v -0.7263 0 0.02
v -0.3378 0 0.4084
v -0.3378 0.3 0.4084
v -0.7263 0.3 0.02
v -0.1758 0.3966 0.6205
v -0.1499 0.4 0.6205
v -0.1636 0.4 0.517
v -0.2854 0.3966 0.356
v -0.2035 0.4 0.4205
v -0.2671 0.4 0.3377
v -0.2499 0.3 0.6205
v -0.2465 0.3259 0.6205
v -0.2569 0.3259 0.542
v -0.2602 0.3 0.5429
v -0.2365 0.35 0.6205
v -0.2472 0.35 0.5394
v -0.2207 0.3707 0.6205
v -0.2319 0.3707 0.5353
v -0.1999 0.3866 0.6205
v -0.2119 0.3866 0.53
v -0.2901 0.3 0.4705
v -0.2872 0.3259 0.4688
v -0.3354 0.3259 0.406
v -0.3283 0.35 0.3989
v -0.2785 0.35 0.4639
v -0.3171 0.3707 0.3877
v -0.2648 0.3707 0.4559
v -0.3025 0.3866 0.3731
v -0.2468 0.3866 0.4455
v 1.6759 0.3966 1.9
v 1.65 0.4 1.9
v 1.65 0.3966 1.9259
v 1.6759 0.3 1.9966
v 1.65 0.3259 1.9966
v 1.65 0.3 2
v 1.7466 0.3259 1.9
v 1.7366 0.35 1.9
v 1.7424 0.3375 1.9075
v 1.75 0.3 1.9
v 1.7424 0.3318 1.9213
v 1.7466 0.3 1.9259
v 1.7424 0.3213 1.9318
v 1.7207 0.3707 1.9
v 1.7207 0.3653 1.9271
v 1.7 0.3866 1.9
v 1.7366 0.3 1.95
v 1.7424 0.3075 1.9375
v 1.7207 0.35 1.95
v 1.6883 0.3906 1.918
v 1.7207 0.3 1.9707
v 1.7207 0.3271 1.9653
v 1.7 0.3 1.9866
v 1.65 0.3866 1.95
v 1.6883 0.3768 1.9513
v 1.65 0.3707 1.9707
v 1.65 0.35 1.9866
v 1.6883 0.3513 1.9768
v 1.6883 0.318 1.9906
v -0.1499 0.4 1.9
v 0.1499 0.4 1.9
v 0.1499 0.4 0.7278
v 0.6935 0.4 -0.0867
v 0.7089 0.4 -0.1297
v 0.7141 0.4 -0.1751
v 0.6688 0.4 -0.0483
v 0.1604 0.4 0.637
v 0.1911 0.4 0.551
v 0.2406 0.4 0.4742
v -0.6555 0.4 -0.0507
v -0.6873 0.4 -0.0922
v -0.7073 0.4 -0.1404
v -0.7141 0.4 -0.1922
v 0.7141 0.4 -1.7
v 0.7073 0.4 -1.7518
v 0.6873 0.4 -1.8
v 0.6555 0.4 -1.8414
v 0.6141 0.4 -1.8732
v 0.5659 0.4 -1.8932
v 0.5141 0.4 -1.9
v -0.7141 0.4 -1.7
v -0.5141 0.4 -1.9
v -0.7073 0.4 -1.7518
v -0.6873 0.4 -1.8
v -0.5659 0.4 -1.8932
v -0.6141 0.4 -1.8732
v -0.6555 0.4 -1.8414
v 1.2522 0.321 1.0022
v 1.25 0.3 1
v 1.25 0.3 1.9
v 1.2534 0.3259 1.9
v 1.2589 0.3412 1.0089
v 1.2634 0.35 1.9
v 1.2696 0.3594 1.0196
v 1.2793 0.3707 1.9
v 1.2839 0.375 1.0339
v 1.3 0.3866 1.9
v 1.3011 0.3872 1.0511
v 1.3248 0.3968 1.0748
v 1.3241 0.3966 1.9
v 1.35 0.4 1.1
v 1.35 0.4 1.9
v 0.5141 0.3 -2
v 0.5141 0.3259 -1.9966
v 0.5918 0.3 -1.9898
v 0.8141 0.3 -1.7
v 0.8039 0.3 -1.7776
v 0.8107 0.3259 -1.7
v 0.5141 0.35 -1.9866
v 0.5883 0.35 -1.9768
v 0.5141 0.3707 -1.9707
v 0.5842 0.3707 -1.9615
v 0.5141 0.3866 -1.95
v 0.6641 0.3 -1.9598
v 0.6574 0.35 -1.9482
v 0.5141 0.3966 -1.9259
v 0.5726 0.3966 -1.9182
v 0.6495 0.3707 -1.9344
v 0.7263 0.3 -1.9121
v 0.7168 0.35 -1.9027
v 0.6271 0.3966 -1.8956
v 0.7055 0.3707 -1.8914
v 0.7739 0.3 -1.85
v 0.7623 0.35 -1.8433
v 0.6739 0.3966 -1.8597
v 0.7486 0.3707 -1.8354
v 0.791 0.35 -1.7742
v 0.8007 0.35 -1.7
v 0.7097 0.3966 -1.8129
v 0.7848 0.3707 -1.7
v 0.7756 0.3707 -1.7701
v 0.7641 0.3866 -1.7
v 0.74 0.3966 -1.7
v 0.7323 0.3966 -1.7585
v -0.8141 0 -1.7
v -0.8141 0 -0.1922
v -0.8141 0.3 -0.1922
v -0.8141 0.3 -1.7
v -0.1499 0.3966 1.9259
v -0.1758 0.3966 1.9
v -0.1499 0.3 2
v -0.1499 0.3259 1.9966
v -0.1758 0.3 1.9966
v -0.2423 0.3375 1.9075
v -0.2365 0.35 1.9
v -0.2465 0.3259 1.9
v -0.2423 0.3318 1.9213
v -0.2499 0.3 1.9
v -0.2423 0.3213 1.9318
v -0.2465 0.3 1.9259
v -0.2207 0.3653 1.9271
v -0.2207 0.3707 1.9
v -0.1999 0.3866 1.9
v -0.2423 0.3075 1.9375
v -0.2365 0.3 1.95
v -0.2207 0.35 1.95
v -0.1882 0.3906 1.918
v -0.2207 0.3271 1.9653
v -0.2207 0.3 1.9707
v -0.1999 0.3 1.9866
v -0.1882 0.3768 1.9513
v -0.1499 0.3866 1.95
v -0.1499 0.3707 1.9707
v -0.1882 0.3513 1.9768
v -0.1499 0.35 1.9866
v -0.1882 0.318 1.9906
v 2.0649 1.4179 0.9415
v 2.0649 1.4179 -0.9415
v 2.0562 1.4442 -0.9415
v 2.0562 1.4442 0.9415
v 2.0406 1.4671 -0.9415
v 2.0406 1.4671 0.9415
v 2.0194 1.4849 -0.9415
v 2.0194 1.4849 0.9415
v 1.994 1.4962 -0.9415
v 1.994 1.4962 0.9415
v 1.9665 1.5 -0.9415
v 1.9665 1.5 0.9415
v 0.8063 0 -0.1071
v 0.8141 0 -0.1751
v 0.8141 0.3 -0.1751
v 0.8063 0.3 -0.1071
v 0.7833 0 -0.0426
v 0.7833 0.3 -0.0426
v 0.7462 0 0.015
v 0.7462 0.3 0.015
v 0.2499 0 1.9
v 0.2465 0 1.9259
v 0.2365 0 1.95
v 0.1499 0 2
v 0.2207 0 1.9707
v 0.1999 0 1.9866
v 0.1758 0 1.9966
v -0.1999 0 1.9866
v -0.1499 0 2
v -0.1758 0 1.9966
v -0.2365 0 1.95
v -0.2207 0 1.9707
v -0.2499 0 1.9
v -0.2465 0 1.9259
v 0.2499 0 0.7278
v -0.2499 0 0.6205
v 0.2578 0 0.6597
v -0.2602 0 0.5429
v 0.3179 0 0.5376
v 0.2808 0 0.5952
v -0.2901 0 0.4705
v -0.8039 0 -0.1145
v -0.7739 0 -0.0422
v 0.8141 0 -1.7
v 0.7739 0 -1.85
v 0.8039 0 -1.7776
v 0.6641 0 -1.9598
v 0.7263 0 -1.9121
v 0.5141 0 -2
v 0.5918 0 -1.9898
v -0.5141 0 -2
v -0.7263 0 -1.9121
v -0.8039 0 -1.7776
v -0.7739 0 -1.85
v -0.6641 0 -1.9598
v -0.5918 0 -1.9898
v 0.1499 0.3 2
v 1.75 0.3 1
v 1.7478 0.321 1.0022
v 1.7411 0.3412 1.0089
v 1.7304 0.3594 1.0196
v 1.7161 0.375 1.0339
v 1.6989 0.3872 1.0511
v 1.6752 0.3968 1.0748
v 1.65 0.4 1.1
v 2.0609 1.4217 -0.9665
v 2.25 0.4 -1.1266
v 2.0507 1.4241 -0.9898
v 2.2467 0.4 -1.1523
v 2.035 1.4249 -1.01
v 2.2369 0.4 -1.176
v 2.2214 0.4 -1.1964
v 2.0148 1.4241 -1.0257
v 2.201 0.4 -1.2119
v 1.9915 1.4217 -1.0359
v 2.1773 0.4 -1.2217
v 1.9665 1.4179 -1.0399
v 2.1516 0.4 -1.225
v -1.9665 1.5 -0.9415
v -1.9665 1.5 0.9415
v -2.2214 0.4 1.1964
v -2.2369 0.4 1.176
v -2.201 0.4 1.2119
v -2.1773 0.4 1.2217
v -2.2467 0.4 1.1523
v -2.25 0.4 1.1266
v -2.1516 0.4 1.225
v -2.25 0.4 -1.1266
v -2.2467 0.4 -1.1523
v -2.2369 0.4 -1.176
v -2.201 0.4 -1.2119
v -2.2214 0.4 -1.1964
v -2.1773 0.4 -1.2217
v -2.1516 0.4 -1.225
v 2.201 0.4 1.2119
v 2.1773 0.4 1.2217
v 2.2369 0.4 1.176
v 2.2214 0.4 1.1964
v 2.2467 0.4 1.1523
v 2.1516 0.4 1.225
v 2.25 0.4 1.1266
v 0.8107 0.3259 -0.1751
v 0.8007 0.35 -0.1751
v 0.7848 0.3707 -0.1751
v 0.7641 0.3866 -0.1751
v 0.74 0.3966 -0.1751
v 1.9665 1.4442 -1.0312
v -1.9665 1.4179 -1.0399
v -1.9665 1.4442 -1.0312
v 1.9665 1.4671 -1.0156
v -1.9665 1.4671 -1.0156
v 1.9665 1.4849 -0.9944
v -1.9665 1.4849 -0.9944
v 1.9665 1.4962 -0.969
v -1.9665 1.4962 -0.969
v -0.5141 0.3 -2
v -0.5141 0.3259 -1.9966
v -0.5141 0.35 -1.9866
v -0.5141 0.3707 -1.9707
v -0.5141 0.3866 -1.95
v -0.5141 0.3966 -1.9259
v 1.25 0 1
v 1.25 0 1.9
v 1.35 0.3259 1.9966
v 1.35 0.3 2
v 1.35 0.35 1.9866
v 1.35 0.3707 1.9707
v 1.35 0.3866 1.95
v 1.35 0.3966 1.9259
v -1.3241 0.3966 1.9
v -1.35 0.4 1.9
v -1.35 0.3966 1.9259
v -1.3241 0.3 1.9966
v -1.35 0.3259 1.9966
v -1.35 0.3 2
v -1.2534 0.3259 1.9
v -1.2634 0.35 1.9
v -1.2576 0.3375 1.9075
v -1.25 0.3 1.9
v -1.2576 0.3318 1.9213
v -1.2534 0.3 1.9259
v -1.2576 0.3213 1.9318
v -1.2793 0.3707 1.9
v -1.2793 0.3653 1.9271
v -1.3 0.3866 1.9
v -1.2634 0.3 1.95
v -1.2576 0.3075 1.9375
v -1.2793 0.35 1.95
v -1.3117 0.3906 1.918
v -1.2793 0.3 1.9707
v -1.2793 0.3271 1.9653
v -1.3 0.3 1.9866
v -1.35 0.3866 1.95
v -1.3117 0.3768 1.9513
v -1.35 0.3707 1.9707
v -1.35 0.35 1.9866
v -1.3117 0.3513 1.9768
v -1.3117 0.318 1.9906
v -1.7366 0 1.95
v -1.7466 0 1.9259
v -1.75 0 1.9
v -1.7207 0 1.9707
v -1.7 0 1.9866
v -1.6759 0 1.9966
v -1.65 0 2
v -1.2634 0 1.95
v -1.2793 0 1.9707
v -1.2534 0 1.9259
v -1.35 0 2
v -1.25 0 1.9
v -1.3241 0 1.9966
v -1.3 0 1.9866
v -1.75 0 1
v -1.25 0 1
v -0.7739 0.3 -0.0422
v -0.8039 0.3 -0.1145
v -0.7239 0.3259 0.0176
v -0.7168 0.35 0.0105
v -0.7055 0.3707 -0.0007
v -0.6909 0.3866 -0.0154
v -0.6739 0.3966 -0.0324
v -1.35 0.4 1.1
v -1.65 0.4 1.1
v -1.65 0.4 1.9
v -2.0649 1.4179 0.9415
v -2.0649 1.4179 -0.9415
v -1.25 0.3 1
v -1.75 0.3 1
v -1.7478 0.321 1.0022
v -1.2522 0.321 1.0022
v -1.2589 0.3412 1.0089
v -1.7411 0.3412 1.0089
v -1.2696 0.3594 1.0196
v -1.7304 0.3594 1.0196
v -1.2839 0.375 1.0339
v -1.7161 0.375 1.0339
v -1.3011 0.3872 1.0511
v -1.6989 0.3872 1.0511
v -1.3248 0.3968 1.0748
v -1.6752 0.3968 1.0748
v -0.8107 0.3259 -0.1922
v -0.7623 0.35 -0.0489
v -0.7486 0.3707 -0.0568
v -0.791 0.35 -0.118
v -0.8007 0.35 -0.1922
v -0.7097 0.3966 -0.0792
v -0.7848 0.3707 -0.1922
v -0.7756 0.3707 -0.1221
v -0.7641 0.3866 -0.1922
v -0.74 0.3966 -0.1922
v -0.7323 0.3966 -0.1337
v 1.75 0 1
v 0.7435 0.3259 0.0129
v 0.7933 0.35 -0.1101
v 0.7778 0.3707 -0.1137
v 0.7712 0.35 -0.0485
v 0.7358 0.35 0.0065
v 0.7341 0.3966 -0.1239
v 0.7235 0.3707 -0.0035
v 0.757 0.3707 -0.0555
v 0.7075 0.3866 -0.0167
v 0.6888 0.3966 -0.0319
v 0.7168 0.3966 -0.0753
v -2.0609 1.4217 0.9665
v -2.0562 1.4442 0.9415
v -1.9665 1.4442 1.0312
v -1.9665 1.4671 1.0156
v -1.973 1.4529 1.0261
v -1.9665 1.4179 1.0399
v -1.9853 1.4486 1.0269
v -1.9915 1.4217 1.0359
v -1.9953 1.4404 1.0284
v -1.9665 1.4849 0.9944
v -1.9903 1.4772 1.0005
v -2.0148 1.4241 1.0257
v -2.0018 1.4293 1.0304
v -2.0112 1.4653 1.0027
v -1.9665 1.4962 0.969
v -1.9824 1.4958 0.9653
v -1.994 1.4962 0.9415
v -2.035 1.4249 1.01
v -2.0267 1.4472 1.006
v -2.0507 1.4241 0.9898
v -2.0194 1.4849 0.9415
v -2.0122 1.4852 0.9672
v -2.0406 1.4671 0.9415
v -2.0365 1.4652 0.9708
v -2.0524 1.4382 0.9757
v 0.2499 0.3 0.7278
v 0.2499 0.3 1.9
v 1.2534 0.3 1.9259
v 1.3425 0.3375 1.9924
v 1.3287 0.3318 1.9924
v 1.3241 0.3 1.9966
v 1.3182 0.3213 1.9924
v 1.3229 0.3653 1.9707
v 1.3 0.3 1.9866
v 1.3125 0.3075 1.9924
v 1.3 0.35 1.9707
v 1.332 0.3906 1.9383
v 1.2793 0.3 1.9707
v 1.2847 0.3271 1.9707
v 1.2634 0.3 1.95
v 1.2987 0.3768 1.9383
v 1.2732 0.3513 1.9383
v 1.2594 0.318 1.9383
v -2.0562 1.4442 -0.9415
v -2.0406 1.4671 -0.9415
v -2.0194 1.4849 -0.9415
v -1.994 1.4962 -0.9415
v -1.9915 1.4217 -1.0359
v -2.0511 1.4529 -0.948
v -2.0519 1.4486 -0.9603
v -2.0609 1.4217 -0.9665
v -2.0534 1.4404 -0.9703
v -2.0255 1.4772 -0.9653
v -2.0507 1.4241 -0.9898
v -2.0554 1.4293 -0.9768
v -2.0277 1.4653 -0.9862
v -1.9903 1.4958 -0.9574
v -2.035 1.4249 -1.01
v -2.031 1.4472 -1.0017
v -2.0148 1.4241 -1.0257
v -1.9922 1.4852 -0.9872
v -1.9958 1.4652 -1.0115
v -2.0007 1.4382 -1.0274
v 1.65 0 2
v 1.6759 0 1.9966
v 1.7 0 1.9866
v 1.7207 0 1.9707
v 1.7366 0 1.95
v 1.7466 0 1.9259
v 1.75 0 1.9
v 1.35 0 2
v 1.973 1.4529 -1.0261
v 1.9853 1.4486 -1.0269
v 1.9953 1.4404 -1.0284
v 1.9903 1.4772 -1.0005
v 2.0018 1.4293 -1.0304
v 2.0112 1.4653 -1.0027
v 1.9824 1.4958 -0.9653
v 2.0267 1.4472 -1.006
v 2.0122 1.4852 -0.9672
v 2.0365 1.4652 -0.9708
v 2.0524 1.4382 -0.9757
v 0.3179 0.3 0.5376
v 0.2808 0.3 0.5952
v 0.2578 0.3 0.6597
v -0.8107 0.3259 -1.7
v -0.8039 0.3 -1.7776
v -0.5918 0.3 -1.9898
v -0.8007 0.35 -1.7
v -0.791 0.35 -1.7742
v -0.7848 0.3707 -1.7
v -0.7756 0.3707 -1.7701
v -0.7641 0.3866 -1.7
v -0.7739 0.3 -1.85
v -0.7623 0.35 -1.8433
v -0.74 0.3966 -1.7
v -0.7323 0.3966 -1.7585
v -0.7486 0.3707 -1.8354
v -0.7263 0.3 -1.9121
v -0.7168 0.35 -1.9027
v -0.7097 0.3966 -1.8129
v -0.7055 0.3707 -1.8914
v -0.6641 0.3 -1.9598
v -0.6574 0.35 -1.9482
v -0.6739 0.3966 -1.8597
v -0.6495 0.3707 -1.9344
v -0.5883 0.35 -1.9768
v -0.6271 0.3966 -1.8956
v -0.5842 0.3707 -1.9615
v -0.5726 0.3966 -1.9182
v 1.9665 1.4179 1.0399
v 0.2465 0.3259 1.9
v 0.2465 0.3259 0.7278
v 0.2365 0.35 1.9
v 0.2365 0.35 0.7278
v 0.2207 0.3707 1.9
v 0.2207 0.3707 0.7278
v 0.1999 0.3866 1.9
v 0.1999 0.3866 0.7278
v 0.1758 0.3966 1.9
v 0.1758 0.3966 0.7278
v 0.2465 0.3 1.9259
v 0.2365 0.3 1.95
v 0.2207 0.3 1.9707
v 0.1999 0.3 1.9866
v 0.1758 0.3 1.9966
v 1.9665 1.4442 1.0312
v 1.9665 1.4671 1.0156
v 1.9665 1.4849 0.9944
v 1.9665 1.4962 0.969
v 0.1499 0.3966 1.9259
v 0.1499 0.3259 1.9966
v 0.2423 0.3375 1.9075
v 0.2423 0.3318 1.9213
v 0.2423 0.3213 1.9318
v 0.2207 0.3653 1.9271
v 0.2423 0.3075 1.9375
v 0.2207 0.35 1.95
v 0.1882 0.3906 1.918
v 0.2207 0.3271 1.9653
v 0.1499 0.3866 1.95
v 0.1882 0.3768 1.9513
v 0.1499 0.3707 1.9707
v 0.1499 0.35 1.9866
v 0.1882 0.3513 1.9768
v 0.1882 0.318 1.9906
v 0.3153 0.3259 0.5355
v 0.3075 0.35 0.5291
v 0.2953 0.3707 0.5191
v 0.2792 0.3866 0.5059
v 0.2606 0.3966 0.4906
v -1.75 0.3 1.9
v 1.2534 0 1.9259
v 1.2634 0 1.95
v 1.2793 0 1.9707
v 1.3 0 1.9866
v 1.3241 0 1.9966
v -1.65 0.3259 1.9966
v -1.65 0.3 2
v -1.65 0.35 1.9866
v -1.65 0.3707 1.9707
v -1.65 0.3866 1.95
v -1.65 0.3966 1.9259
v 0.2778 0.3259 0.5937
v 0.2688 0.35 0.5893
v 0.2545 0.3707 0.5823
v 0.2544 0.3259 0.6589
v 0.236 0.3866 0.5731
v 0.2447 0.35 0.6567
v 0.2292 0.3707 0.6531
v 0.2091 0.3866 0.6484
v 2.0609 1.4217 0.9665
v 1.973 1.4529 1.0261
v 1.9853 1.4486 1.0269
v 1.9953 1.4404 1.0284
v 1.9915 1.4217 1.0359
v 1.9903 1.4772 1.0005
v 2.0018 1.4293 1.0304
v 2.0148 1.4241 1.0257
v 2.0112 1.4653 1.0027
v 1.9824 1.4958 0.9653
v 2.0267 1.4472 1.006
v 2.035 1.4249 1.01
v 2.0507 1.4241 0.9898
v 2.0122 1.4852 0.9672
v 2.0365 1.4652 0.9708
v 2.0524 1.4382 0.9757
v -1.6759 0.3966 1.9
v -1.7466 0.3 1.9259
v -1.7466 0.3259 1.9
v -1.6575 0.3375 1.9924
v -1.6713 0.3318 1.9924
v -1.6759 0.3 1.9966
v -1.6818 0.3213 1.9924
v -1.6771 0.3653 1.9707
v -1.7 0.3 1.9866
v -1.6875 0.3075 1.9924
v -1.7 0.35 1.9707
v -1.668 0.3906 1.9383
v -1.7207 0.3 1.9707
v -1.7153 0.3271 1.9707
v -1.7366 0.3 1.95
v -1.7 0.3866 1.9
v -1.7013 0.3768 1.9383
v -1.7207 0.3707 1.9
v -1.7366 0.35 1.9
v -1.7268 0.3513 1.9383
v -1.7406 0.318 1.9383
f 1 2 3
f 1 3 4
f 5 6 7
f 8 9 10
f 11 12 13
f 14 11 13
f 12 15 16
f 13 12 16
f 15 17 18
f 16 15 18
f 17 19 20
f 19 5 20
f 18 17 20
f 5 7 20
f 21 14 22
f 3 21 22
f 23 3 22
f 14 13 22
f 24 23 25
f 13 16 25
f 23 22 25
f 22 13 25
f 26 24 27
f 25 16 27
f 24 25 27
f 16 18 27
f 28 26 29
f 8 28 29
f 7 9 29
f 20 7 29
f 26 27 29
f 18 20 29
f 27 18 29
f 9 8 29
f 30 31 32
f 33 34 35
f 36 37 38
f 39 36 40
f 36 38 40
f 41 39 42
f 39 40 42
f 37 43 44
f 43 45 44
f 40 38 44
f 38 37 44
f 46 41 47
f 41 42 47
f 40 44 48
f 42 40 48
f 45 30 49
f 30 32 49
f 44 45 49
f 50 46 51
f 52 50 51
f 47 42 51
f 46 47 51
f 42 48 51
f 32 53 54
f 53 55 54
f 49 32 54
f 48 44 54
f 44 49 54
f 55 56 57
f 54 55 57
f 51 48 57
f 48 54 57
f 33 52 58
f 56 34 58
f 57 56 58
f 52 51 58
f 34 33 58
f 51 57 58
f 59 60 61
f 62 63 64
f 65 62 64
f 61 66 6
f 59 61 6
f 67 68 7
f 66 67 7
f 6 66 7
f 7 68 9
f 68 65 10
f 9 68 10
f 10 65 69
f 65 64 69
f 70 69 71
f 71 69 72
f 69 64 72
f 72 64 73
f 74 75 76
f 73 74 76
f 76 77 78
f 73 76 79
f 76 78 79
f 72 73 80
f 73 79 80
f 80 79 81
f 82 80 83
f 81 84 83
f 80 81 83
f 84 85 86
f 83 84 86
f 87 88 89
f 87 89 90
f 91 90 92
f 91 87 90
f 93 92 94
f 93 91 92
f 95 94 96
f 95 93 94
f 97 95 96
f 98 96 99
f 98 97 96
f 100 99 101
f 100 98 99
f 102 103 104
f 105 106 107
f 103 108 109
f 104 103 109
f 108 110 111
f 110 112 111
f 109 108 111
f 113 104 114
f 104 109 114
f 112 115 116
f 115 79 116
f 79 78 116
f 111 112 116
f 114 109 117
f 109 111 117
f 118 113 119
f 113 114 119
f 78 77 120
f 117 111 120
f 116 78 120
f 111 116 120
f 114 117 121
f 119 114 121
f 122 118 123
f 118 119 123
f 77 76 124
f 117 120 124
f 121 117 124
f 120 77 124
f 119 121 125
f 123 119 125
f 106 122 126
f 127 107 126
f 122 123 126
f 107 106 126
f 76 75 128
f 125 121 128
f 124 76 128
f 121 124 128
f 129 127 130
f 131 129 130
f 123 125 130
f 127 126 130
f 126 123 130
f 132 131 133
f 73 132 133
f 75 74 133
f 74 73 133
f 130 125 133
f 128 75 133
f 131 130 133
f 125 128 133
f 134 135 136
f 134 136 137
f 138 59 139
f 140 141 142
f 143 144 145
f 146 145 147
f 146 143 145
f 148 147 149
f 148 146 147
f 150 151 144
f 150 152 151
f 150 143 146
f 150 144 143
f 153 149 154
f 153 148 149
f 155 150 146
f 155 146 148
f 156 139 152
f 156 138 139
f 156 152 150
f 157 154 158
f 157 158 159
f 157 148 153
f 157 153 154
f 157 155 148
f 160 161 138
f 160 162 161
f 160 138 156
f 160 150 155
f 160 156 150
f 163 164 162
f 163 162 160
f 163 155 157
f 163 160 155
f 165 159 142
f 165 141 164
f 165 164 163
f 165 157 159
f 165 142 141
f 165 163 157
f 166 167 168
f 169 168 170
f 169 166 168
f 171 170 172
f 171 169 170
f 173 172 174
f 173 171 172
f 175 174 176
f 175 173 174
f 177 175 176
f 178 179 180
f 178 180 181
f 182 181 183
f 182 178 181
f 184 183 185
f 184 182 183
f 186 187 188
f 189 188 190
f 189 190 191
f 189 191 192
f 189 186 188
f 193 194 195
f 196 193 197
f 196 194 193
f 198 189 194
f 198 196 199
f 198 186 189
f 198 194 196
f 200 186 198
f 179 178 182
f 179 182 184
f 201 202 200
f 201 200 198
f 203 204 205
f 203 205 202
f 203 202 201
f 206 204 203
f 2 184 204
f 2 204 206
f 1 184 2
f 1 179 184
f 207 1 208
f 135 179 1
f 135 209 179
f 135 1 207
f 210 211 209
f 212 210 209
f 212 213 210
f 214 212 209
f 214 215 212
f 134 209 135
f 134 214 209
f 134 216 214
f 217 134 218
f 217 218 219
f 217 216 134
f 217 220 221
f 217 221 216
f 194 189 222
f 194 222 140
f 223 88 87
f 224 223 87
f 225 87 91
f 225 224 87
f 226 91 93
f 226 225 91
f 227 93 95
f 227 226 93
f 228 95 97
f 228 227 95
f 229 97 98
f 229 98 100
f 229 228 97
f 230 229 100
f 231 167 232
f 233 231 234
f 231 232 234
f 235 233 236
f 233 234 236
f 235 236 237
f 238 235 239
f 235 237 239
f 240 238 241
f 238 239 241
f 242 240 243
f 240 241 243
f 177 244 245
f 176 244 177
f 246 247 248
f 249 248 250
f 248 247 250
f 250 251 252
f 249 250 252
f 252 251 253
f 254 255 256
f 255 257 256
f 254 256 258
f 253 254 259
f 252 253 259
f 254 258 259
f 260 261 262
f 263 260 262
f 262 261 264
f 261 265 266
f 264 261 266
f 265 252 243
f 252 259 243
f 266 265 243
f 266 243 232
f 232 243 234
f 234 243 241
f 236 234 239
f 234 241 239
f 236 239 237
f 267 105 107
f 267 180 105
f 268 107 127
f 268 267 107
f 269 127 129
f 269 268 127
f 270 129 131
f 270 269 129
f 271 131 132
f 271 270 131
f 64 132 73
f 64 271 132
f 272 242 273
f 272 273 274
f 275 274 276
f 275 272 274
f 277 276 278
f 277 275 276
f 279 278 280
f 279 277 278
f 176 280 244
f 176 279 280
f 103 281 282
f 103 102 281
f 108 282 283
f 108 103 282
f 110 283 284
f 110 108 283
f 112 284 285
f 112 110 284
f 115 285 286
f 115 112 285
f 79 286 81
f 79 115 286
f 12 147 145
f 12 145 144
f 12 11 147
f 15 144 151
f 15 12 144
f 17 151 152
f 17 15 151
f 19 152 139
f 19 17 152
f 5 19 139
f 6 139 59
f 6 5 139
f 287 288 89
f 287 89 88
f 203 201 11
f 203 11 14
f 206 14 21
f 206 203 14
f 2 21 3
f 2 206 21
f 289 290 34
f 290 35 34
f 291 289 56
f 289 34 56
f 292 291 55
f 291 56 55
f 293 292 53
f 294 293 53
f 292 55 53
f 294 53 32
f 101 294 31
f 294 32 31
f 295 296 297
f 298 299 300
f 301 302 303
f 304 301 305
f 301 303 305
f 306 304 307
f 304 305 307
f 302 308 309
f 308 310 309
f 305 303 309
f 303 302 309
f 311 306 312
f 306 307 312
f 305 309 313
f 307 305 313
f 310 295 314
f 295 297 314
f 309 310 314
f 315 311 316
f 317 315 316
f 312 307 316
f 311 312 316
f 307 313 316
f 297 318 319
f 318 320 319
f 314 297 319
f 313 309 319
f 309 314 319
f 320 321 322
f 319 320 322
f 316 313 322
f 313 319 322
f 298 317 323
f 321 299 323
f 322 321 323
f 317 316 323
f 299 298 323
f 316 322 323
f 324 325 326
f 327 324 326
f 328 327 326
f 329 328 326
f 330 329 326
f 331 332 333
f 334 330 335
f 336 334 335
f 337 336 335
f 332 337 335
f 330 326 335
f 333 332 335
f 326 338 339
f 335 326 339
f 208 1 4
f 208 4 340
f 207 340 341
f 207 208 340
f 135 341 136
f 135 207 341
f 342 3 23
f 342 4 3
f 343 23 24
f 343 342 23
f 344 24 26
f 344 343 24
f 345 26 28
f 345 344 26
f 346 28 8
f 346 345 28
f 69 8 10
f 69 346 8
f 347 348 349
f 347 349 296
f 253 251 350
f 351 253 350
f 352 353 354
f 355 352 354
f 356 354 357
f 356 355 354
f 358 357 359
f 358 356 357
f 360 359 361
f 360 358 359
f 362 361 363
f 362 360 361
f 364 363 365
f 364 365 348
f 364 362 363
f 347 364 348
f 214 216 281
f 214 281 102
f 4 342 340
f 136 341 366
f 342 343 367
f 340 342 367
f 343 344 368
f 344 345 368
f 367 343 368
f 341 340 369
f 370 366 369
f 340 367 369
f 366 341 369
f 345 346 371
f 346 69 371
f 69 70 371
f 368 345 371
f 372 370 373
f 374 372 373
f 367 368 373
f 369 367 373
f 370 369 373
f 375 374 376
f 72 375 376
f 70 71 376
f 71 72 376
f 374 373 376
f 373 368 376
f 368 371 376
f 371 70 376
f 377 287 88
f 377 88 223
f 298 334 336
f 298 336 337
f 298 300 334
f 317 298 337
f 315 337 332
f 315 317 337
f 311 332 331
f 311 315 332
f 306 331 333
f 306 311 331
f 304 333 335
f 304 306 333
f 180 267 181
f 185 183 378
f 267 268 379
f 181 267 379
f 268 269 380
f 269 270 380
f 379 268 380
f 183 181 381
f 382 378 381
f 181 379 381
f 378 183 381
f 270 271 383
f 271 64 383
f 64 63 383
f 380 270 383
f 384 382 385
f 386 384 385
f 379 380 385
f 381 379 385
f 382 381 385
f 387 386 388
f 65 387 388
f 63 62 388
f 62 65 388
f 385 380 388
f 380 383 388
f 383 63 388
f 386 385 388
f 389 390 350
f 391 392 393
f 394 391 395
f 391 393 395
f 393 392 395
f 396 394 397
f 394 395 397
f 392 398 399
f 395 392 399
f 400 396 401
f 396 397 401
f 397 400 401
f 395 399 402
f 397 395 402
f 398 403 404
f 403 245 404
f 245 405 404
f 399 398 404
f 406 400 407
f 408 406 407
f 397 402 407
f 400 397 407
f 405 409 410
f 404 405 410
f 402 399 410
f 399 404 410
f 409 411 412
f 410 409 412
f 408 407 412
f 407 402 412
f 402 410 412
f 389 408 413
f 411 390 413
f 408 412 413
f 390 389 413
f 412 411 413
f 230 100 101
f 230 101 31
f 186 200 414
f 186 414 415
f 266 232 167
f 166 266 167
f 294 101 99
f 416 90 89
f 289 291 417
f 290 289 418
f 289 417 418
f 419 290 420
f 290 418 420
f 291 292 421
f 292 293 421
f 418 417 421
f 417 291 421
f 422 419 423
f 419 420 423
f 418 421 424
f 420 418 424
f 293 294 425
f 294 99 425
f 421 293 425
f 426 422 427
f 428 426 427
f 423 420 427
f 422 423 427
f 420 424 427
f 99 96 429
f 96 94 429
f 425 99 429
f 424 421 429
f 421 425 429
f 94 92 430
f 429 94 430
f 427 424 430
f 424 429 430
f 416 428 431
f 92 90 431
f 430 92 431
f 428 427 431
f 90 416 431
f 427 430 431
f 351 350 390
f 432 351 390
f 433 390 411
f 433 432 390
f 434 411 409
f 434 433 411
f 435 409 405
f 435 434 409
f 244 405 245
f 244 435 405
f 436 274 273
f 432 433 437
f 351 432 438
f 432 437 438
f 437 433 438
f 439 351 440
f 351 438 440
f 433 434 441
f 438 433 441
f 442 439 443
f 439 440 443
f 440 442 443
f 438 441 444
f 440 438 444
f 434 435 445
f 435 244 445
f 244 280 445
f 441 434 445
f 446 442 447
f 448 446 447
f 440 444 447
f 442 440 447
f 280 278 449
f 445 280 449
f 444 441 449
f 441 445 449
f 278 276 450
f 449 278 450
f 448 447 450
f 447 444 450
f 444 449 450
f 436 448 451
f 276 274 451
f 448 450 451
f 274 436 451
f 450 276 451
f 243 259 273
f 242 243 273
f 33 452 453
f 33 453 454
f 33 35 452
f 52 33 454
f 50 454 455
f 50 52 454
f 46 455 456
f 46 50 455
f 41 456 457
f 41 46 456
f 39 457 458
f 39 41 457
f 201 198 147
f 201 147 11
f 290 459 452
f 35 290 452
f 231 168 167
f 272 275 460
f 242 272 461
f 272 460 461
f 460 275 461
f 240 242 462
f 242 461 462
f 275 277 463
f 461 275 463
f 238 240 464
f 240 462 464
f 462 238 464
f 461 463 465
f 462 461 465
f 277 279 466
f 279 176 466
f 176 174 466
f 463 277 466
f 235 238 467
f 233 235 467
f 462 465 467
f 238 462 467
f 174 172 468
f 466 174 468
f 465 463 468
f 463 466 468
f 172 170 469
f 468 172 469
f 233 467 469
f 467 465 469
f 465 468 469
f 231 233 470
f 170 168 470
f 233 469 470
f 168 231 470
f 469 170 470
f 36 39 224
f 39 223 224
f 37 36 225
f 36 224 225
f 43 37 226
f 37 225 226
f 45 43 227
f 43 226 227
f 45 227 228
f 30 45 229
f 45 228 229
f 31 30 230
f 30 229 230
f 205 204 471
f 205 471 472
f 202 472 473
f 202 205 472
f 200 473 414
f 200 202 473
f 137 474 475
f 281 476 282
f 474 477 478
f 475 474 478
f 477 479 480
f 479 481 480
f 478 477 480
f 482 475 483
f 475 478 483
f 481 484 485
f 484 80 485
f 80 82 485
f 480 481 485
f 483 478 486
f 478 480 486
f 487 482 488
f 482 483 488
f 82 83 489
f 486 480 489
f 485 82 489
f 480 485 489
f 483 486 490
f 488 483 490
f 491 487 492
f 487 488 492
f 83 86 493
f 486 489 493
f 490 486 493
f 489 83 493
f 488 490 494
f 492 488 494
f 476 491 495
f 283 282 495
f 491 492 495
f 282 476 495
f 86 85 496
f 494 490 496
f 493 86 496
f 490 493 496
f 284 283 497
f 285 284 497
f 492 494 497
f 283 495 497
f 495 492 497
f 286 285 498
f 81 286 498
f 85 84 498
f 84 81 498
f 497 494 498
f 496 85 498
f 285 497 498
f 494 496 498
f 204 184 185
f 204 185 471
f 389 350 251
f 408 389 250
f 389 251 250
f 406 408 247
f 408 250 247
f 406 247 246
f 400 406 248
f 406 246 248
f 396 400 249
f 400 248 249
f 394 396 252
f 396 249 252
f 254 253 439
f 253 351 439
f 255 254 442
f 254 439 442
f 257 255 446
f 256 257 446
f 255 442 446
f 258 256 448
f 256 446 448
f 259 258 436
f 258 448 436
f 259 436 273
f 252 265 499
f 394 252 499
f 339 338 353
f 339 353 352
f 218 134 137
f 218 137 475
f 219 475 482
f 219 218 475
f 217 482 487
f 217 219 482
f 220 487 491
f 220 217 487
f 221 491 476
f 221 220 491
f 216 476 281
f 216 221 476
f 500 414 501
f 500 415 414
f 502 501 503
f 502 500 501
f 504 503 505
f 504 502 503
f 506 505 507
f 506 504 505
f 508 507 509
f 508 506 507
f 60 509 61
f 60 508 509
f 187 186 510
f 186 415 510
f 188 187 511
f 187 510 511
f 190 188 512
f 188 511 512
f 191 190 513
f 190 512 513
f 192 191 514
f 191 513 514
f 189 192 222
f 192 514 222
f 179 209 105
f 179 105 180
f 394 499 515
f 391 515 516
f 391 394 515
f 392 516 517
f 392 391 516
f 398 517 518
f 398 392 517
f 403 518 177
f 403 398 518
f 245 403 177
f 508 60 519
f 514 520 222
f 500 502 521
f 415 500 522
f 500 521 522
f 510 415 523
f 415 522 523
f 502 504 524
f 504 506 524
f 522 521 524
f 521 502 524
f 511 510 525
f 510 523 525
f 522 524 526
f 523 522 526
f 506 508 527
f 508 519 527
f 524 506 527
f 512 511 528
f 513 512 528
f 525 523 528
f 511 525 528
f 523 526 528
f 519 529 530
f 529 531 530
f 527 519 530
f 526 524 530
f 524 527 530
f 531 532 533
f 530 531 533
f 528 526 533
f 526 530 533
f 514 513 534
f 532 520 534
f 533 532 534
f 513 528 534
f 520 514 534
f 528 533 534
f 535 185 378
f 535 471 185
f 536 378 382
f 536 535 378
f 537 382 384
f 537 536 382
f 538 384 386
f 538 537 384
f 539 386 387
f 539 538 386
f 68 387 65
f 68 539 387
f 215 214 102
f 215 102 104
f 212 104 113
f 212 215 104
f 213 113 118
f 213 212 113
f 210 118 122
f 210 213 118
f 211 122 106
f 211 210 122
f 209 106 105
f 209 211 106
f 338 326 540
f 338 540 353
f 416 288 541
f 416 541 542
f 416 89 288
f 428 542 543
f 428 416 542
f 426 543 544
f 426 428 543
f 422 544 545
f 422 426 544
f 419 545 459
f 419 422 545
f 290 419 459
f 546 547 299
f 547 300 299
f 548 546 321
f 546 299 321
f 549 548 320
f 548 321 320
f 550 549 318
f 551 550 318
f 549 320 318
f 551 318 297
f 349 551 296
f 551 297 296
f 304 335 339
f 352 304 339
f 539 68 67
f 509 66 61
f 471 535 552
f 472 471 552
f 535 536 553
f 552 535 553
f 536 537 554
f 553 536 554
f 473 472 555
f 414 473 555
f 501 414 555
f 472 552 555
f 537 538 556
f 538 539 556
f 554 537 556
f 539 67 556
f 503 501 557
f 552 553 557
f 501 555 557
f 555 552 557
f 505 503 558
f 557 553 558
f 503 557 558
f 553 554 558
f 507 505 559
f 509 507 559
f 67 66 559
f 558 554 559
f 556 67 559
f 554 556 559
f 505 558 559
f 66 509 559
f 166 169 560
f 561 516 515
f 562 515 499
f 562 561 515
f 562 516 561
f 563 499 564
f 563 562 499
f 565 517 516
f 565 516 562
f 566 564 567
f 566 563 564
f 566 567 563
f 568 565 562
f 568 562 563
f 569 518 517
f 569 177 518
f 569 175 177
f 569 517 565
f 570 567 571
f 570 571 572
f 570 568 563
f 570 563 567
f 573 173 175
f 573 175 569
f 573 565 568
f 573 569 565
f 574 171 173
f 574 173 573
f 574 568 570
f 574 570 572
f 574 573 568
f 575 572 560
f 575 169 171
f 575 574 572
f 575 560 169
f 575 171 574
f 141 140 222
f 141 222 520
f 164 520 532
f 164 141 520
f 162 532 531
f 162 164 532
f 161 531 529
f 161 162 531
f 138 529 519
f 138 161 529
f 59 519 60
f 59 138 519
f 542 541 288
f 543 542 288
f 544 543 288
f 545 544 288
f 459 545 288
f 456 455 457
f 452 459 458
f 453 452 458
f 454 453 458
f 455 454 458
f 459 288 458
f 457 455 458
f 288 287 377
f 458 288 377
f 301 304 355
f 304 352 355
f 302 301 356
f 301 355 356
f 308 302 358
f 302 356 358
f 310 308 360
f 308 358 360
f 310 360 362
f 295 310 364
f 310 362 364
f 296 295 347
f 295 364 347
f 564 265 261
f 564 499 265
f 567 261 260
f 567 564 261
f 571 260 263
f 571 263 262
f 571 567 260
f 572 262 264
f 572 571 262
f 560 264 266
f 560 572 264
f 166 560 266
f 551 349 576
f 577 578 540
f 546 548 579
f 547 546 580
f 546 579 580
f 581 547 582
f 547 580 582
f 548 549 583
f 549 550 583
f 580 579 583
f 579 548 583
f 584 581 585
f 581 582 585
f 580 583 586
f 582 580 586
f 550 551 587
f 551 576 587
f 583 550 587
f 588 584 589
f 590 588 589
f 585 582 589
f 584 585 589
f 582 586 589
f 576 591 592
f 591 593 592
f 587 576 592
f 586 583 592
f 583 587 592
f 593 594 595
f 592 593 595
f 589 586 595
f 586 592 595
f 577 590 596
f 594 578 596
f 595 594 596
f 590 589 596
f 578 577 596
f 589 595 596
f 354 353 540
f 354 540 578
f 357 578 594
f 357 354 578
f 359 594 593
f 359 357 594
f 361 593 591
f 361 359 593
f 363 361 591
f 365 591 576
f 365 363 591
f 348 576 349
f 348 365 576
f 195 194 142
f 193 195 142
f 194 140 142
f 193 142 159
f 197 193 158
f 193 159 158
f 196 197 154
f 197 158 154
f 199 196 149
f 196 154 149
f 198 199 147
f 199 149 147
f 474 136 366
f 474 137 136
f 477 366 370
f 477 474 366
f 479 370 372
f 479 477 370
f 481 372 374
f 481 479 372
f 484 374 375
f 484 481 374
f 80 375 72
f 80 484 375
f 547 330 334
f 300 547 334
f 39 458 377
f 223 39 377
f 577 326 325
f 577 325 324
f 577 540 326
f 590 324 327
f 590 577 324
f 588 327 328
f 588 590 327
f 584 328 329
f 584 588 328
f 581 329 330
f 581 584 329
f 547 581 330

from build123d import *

# Parameters (mm, degrees)
EXTRUDE_1_DEPTH   = 0.4
SKETCH_1_W        = 0.5
SKETCH_1_H        = 1
EXTRUDE_1_2_DEPTH = 0.4
EXTRUDE_1_3_DEPTH = 0.4
FILLET_1_R        = 0.1
FILLET_2_R        = 0.1
FILLET_3_R        = 0.1
SKETCH_2_W        = 4.5
SKETCH_2_H        = 2.45
EXTRUDE_2_DEPTH   = 1.1
CHAMFER_1_SIZE    = 1.1
CHAMFER_1_SIZE_2  = 0.2
FILLET_4_R        = 0.1


with BuildPart() as part:
    # Эскиз1 → Бобышка-Вытянуть1 (new body)
    with BuildSketch(Plane(origin=(0, 0, 0), x_dir=(1, 0, 0), z_dir=(0, 1, 0))):
        with BuildLine():
            Line((-0.249947437, -1), (-0.249947437, -0.62054925))
            ThreePointArc((-0.249947437, -0.62054925), (-0.272783577, -0.50574422), (-0.337815403, -0.408417215))
            Line((-0.337815403, -0.408417215), (-0.726260523, -0.019972095))
            ThreePointArc((-0.726260523, -0.019972095), (-0.791292348, 0.077354909), (-0.814128489, 0.192159939))
            Line((-0.814128489, 0.192159939), (-0.814128489, 1.7))
            ThreePointArc((-0.814128489, 1.7), (-0.726260523, 1.912132034), (-0.514128489, 2))
            Line((-0.514128489, 2), (0.514128489, 2))
            ThreePointArc((0.514128489, 2), (0.726260523, 1.912132034), (0.814128489, 1.7))
            Line((0.814128489, 1.7), (0.814128489, 0.17511839))
            ThreePointArc((0.814128489, 0.17511839), (0.796627294, 0.074150944), (0.746165655, -0.015036161))
            Line((0.746165655, -0.015036161), (0.31791027, -0.537617218))
            ThreePointArc((0.31791027, -0.537617218), (0.267448632, -0.626804324), (0.249947437, -0.727771769))
            Line((0.249947437, -0.727771769), (0.249947437, -1))
            Line((0.249947437, -1), (0.249947437, -2))
            Line((0.249947437, -2), (-0.249947437, -2))
            Line((-0.249947437, -2), (-0.249947437, -1))
        make_face()
    extrude(amount=EXTRUDE_1_DEPTH)

    # Скругление1
    fillet_1_edges = [part.edges().sort_by_distance(p)[0] for p in [
        (0, 0.4, 2),
        (0.249947437, 0.4, 1.363885884),
        (0.267448632, 0.4, 0.626804324),
        (0.532037963, 0.4, 0.27632669),
        (0.249947437, 0.2, 2),
        (-0.249947437, 0.2, 2),
        (0.796627294, 0.4, -0.074150944),
        (0.814128489, 0.4, -0.937559195),
        (0.726260523, 0.4, -1.912132034),
        (0, 0.4, -2),
        (-0.272783577, 0.4, 0.50574422),
        (-0.726260523, 0.4, -1.912132034),
        (-0.814128489, 0.4, -0.94607997),
        (-0.791292348, 0.4, -0.077354909),
        (-0.532037963, 0.4, 0.214194655),
        (-0.249947437, 0.4, 1.310274625),
    ]]
    fillet(fillet_1_edges, radius=FILLET_1_R)


with BuildPart() as body_2:
    # Эскиз1 → Extrude 1 2 (new body)
    with BuildSketch(Plane(origin=(0, 0, 0), x_dir=(1, 0, 0), z_dir=(0, 1, 0))):
        with Locations((-1.5, -1.5)):
            Rectangle(SKETCH_1_W, SKETCH_1_H)
    extrude(amount=EXTRUDE_1_2_DEPTH)

    # Скругление2
    fillet_2_edges = [body_2.edges().sort_by_distance(p)[0] for p in [
        (-1.75, 0.4, 1.5),
        (-1.5, 0.4, 2),
        (-1.25, 0.4, 1.5),
        (-1.5, 0.4, 1),
        (-1.25, 0.2, 2),
        (-1.75, 0.2, 2),
    ]]
    fillet(fillet_2_edges, radius=FILLET_2_R)


with BuildPart() as body_3:
    # Эскиз1 → Extrude 1 3 (new body)
    with BuildSketch(Plane(origin=(0, 0, 0), x_dir=(1, 0, 0), z_dir=(0, 1, 0))):
        with Locations((1.5, -1.5)):
            Rectangle(SKETCH_1_W, SKETCH_1_H)
    extrude(amount=EXTRUDE_1_3_DEPTH)

    # Скругление3
    fillet_3_edges = [body_3.edges().sort_by_distance(p)[0] for p in [
        (1.25, 0.4, 1.5),
        (1.5, 0.4, 2),
        (1.75, 0.4, 1.5),
        (1.5, 0.4, 1),
        (1.75, 0.2, 2),
        (1.25, 0.2, 2),
    ]]
    fillet(fillet_3_edges, radius=FILLET_3_R)


with BuildPart() as body_4:
    # Эскиз2 → Бобышка-Вытянуть2 (new body)
    with BuildSketch(Plane(origin=(0, 0.4, 0), x_dir=(1, 0, 0), z_dir=(0, 1, 0))):
        Rectangle(SKETCH_2_W, SKETCH_2_H)
    extrude(amount=EXTRUDE_2_DEPTH)

    # Фаска1
    # the kernel refuses this chamfer: 1.1, 0.2 mm, written as the material it takes off along each edge
    with BuildSketch(Plane(origin=(5.108293424, 1.5, 1.225), x_dir=(0, -0.9999763028084744, 0.006884317068103953), z_dir=(-1, 0, 0)), Plane(origin=(-5.108293424, 1.5, -1.225), x_dir=(0, -0.9999763028084744, -0.006884317068103953), z_dir=(1, 0, 0))) as chamfer_1_piece_1:
        Polygon((CHAMFER_1_SIZE * 0.999976302808, -CHAMFER_1_SIZE * 0.0068843170681), (-CHAMFER_1_SIZE_2 * 0.0068843170681, -CHAMFER_1_SIZE_2 * 0.999976302808), (0, 0), align=None)
    extrude(amount=10.216586847, mode=Mode.SUBTRACT)
    with BuildSketch(Plane(origin=(-2.25, 1.5, 4.083293424), x_dir=(-0.006884317068103953, -0.9999763028084744, 0), z_dir=(0, 0, -1)), Plane(origin=(2.25, 1.5, -4.083293424), x_dir=(0.006884317068103953, -0.9999763028084744, 0), z_dir=(0, 0, 1))) as chamfer_1_piece_2:
        Polygon((CHAMFER_1_SIZE * 0.999976302808, -CHAMFER_1_SIZE * 0.0068843170681), (-CHAMFER_1_SIZE_2 * 0.0068843170681, -CHAMFER_1_SIZE_2 * 0.999976302808), (0, 0), align=None)
    extrude(amount=8.166586847, mode=Mode.SUBTRACT)

    # Скругление4
    fillet_4_edges = [body_4.edges().sort_by_distance(p)[0] for p in [
        (2.05, 1.5, 0),
        (0, 1.5, -1.025),
        (-2.05, 1.5, 0),
        (0, 1.5, 1.025),
        (-2.15, 0.95, -1.125),
        (2.15, 0.95, -1.125),
        (-2.15, 0.95, 1.125),
        (2.15, 0.95, 1.125),
    ]]
    fillet(fillet_4_edges, radius=FILLET_4_R)


solid = Compound([part.part, body_2.part, body_3.part, body_4.part])
